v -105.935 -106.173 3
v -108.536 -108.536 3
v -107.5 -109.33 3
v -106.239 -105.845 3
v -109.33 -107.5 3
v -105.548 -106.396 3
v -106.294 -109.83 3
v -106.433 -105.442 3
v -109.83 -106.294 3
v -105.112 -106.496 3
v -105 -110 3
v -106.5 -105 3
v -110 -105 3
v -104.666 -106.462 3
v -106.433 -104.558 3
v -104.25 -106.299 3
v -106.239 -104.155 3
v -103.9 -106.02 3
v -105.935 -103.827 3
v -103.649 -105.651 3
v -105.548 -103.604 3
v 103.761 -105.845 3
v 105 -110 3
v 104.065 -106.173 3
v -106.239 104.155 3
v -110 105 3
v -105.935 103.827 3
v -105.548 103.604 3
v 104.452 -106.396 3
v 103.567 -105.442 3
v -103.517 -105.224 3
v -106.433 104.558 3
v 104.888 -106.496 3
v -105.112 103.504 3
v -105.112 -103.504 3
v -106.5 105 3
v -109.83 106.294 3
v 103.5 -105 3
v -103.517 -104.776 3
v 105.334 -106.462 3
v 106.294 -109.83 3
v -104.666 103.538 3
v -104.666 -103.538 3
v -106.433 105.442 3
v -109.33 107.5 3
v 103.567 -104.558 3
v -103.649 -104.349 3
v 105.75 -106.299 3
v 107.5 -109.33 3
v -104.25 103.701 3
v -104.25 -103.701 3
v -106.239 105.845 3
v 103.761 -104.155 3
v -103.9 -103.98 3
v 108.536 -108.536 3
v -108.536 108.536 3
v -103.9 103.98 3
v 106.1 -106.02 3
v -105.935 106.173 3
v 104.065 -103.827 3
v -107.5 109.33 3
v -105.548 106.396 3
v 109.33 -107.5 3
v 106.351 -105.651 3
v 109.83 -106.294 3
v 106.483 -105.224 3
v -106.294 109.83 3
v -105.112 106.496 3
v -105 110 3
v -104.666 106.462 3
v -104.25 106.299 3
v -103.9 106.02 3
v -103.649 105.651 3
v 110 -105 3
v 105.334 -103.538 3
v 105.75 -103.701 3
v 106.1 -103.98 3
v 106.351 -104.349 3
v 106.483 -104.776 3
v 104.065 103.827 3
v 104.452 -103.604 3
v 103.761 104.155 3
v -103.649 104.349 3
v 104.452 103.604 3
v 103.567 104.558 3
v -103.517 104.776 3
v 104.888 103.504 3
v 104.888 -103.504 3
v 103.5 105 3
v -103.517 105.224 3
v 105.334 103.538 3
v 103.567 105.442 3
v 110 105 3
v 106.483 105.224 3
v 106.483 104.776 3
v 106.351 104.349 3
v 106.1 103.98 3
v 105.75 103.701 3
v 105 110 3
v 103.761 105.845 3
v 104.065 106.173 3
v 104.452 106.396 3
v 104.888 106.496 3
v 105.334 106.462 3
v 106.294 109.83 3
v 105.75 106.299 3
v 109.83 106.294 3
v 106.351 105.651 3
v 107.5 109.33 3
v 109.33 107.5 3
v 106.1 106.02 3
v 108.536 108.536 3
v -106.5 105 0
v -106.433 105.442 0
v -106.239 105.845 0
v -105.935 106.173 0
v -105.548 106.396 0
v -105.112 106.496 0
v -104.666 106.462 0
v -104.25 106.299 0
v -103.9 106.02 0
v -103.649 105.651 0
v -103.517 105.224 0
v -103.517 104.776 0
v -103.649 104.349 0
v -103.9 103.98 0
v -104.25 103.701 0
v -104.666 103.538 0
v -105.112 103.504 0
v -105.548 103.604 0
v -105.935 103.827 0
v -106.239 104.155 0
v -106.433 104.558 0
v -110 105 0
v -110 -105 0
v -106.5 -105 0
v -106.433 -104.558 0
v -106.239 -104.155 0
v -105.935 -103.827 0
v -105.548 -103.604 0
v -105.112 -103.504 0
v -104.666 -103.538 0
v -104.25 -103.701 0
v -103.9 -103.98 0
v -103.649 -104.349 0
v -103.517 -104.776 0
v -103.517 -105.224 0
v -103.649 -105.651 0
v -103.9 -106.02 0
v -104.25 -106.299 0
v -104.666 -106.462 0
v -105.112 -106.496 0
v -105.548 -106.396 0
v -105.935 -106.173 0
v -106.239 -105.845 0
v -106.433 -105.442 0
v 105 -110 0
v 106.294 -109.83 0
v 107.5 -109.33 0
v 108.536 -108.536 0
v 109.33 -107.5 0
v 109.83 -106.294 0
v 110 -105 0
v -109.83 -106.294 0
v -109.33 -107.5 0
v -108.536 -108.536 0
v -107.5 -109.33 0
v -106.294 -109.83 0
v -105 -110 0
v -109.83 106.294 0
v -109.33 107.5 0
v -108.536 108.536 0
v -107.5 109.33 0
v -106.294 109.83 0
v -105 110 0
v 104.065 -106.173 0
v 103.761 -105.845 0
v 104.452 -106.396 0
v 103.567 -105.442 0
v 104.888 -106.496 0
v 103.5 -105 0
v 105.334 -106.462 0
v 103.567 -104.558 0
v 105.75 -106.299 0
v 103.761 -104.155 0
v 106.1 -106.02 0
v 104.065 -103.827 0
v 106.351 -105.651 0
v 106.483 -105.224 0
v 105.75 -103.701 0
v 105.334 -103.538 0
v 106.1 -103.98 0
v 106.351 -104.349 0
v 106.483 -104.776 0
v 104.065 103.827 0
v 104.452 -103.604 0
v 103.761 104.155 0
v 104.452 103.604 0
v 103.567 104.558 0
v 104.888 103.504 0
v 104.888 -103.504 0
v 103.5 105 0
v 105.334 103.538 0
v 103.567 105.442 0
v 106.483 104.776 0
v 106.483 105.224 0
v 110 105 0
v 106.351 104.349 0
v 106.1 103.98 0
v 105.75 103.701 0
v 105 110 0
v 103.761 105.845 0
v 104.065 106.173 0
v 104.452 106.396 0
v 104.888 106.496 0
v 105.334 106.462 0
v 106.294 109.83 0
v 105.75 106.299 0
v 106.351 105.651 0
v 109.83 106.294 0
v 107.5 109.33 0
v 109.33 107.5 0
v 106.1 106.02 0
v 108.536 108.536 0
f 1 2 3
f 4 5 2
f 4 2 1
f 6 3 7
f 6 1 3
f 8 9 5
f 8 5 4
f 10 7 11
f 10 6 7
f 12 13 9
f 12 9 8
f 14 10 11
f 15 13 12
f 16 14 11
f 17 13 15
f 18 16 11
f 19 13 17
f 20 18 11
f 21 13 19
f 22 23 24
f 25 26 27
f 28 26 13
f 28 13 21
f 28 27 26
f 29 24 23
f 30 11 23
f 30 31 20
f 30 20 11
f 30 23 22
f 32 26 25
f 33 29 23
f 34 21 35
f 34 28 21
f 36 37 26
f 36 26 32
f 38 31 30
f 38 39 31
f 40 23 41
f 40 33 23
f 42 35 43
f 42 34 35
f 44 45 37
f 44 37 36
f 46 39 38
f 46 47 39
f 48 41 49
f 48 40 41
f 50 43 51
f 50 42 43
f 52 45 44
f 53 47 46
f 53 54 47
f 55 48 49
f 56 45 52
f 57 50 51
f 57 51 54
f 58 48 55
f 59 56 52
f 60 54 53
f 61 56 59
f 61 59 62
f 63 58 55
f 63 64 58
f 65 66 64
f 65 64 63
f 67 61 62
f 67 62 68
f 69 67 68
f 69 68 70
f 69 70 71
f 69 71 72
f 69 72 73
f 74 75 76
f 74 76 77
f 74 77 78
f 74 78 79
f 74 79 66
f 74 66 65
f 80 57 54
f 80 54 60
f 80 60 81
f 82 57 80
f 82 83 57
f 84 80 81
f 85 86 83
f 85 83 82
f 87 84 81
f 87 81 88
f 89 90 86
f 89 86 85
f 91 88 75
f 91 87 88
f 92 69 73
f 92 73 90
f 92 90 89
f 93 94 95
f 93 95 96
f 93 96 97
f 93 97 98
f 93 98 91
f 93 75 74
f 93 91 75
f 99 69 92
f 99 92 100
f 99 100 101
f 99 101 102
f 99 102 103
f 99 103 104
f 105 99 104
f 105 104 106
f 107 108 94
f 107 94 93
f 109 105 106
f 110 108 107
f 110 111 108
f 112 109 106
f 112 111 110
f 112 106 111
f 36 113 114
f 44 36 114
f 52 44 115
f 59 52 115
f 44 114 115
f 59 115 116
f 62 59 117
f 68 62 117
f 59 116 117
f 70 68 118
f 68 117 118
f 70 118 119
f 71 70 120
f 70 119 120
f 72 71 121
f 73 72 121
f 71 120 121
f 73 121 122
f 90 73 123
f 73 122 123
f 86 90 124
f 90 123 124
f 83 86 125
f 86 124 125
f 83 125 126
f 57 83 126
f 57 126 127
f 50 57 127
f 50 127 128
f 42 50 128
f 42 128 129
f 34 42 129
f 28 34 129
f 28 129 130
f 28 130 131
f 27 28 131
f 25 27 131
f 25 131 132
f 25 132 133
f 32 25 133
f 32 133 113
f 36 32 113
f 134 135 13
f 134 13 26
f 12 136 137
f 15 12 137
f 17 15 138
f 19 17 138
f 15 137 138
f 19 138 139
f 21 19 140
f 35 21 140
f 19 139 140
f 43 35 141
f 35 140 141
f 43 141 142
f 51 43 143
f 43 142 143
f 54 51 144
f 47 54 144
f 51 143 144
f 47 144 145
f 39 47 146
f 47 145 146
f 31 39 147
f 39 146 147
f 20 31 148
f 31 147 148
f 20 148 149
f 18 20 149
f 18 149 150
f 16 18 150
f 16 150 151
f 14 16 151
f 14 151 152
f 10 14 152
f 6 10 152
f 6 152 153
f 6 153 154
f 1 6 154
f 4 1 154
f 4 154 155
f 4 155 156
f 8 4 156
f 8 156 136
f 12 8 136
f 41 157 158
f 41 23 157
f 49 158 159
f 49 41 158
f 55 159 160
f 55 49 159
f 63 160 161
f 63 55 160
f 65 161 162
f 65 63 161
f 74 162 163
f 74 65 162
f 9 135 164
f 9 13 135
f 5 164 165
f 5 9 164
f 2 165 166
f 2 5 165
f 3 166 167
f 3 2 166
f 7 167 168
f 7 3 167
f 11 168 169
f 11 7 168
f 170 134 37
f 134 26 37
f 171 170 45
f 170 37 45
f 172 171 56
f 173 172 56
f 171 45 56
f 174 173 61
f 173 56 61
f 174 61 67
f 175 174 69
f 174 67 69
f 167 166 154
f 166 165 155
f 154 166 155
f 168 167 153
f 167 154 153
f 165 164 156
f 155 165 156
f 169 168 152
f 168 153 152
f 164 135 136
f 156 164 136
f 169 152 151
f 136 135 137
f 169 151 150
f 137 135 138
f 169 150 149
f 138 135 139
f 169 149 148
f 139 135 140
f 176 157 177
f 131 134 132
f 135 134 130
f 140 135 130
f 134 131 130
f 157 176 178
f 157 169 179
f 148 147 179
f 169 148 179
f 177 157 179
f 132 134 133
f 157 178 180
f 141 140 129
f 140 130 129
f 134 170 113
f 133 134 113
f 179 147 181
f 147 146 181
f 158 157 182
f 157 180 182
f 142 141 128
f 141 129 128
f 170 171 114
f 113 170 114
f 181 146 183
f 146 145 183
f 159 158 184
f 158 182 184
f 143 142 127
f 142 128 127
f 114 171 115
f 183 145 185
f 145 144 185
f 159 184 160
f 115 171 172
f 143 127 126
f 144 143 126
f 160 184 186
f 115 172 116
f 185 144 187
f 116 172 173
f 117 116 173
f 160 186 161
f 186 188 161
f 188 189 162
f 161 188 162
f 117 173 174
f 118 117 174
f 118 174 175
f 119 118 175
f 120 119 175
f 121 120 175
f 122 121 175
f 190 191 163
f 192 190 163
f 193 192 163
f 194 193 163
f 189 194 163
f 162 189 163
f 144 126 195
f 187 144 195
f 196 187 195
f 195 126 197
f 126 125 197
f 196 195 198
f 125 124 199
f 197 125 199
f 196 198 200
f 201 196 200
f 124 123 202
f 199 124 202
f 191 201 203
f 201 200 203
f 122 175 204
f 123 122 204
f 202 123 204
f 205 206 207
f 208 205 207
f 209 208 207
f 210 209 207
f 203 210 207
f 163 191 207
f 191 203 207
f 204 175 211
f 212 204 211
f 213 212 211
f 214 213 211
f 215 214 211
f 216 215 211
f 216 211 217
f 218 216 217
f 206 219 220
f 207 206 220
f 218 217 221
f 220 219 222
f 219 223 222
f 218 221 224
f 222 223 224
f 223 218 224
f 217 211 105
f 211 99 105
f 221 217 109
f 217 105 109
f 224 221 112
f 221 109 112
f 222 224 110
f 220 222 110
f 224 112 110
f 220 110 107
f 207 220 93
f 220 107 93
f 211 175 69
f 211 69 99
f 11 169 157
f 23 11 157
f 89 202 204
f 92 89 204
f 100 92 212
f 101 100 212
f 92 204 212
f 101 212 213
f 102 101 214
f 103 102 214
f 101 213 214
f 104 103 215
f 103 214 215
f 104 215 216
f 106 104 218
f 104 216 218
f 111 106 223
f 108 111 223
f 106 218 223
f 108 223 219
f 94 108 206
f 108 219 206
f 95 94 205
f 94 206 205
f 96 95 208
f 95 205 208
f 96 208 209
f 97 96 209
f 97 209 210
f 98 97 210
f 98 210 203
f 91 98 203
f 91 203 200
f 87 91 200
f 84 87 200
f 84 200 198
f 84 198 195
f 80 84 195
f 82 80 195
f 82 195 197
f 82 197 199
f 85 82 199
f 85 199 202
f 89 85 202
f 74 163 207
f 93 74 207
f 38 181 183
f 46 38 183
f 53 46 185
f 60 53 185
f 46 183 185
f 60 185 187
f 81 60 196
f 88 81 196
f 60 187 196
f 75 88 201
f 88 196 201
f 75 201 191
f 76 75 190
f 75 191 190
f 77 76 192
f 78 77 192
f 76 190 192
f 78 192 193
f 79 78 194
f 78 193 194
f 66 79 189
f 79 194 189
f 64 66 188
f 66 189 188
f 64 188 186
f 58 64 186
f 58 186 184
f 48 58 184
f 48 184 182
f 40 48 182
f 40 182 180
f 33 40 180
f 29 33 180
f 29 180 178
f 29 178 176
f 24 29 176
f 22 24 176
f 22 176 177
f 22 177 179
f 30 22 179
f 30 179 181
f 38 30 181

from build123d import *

# Parameters (mm, degrees)
SZKIC1_W                    = 220
SZKIC1_H                    = 220
DODANIE_WYCI_GNI_CIE1_DEPTH = 3
WYTNIJ_WYCI_GNI_CIE2_REACH  = 157.592
SZKIC2_R                    = 1.5
ZAOKR_GLENIE1_R             = 5


with BuildPart() as part:
    # Szkic1 → Dodanie-wyciągnięcie1 (new body)
    with BuildSketch(Plane.XY):
        Rectangle(SZKIC1_W, SZKIC1_H)
    extrude(amount=DODANIE_WYCI_GNI_CIE1_DEPTH)

    # Szkic2 → Wytnij-wyciągnięcie2 (cut, up to next)
    with BuildSketch(Plane(origin=(0, 0, 0), x_dir=(-1, 0, 0), z_dir=(0, 0, -1)), mode=Mode.PRIVATE) as wytnij_wyci_gni_cie2_sk1:
        with Locations((105, -105)):
            Circle(SZKIC2_R)
    wytnij_wyci_gni_cie2_tool1 = extrude(wytnij_wyci_gni_cie2_sk1.sketch, amount=-WYTNIJ_WYCI_GNI_CIE2_REACH, mode=Mode.PRIVATE) & part.part
    # Szkic2 → Wytnij-wyciągnięcie2 (cut, up to next)
    with BuildSketch(Plane(origin=(0, 0, 0), x_dir=(-1, 0, 0), z_dir=(0, 0, -1)), mode=Mode.PRIVATE) as wytnij_wyci_gni_cie2_sk2:
        with Locations((105, 105)):
            Circle(SZKIC2_R)
    wytnij_wyci_gni_cie2_tool2 = extrude(wytnij_wyci_gni_cie2_sk2.sketch, amount=-WYTNIJ_WYCI_GNI_CIE2_REACH, mode=Mode.PRIVATE) & part.part
    # Szkic2 → Wytnij-wyciągnięcie2 (cut, up to next)
    with BuildSketch(Plane(origin=(0, 0, 0), x_dir=(-1, 0, 0), z_dir=(0, 0, -1)), mode=Mode.PRIVATE) as wytnij_wyci_gni_cie2_sk3:
        with Locations((-105, 105)):
            Circle(SZKIC2_R)
    wytnij_wyci_gni_cie2_tool3 = extrude(wytnij_wyci_gni_cie2_sk3.sketch, amount=-WYTNIJ_WYCI_GNI_CIE2_REACH, mode=Mode.PRIVATE) & part.part
    # Szkic2 → Wytnij-wyciągnięcie2 (cut, up to next)
    with BuildSketch(Plane(origin=(0, 0, 0), x_dir=(-1, 0, 0), z_dir=(0, 0, -1)), mode=Mode.PRIVATE) as wytnij_wyci_gni_cie2_sk4:
        with Locations((-105, -105)):
            Circle(SZKIC2_R)
    wytnij_wyci_gni_cie2_tool4 = extrude(wytnij_wyci_gni_cie2_sk4.sketch, amount=-WYTNIJ_WYCI_GNI_CIE2_REACH, mode=Mode.PRIVATE) & part.part
    add(wytnij_wyci_gni_cie2_tool1.solids().sort_by_distance((-105, -105, 0))[0], mode=Mode.SUBTRACT)
    add(wytnij_wyci_gni_cie2_tool2.solids().sort_by_distance((-105, 105, 0))[0], mode=Mode.SUBTRACT)
    add(wytnij_wyci_gni_cie2_tool3.solids().sort_by_distance((105, 105, 0))[0], mode=Mode.SUBTRACT)
    add(wytnij_wyci_gni_cie2_tool4.solids().sort_by_distance((105, -105, 0))[0], mode=Mode.SUBTRACT)

    # Zaokrąglenie1
    zaokr_glenie1_edges = [part.edges().sort_by_distance(p)[0] for p in [
        (110, -110, 1.5),
        (-110, -110, 1.5),
        (-110, 110, 1.5),
        (110, 110, 1.5),
    ]]
    fillet(zaokr_glenie1_edges, radius=ZAOKR_GLENIE1_R)


solid = part.part
